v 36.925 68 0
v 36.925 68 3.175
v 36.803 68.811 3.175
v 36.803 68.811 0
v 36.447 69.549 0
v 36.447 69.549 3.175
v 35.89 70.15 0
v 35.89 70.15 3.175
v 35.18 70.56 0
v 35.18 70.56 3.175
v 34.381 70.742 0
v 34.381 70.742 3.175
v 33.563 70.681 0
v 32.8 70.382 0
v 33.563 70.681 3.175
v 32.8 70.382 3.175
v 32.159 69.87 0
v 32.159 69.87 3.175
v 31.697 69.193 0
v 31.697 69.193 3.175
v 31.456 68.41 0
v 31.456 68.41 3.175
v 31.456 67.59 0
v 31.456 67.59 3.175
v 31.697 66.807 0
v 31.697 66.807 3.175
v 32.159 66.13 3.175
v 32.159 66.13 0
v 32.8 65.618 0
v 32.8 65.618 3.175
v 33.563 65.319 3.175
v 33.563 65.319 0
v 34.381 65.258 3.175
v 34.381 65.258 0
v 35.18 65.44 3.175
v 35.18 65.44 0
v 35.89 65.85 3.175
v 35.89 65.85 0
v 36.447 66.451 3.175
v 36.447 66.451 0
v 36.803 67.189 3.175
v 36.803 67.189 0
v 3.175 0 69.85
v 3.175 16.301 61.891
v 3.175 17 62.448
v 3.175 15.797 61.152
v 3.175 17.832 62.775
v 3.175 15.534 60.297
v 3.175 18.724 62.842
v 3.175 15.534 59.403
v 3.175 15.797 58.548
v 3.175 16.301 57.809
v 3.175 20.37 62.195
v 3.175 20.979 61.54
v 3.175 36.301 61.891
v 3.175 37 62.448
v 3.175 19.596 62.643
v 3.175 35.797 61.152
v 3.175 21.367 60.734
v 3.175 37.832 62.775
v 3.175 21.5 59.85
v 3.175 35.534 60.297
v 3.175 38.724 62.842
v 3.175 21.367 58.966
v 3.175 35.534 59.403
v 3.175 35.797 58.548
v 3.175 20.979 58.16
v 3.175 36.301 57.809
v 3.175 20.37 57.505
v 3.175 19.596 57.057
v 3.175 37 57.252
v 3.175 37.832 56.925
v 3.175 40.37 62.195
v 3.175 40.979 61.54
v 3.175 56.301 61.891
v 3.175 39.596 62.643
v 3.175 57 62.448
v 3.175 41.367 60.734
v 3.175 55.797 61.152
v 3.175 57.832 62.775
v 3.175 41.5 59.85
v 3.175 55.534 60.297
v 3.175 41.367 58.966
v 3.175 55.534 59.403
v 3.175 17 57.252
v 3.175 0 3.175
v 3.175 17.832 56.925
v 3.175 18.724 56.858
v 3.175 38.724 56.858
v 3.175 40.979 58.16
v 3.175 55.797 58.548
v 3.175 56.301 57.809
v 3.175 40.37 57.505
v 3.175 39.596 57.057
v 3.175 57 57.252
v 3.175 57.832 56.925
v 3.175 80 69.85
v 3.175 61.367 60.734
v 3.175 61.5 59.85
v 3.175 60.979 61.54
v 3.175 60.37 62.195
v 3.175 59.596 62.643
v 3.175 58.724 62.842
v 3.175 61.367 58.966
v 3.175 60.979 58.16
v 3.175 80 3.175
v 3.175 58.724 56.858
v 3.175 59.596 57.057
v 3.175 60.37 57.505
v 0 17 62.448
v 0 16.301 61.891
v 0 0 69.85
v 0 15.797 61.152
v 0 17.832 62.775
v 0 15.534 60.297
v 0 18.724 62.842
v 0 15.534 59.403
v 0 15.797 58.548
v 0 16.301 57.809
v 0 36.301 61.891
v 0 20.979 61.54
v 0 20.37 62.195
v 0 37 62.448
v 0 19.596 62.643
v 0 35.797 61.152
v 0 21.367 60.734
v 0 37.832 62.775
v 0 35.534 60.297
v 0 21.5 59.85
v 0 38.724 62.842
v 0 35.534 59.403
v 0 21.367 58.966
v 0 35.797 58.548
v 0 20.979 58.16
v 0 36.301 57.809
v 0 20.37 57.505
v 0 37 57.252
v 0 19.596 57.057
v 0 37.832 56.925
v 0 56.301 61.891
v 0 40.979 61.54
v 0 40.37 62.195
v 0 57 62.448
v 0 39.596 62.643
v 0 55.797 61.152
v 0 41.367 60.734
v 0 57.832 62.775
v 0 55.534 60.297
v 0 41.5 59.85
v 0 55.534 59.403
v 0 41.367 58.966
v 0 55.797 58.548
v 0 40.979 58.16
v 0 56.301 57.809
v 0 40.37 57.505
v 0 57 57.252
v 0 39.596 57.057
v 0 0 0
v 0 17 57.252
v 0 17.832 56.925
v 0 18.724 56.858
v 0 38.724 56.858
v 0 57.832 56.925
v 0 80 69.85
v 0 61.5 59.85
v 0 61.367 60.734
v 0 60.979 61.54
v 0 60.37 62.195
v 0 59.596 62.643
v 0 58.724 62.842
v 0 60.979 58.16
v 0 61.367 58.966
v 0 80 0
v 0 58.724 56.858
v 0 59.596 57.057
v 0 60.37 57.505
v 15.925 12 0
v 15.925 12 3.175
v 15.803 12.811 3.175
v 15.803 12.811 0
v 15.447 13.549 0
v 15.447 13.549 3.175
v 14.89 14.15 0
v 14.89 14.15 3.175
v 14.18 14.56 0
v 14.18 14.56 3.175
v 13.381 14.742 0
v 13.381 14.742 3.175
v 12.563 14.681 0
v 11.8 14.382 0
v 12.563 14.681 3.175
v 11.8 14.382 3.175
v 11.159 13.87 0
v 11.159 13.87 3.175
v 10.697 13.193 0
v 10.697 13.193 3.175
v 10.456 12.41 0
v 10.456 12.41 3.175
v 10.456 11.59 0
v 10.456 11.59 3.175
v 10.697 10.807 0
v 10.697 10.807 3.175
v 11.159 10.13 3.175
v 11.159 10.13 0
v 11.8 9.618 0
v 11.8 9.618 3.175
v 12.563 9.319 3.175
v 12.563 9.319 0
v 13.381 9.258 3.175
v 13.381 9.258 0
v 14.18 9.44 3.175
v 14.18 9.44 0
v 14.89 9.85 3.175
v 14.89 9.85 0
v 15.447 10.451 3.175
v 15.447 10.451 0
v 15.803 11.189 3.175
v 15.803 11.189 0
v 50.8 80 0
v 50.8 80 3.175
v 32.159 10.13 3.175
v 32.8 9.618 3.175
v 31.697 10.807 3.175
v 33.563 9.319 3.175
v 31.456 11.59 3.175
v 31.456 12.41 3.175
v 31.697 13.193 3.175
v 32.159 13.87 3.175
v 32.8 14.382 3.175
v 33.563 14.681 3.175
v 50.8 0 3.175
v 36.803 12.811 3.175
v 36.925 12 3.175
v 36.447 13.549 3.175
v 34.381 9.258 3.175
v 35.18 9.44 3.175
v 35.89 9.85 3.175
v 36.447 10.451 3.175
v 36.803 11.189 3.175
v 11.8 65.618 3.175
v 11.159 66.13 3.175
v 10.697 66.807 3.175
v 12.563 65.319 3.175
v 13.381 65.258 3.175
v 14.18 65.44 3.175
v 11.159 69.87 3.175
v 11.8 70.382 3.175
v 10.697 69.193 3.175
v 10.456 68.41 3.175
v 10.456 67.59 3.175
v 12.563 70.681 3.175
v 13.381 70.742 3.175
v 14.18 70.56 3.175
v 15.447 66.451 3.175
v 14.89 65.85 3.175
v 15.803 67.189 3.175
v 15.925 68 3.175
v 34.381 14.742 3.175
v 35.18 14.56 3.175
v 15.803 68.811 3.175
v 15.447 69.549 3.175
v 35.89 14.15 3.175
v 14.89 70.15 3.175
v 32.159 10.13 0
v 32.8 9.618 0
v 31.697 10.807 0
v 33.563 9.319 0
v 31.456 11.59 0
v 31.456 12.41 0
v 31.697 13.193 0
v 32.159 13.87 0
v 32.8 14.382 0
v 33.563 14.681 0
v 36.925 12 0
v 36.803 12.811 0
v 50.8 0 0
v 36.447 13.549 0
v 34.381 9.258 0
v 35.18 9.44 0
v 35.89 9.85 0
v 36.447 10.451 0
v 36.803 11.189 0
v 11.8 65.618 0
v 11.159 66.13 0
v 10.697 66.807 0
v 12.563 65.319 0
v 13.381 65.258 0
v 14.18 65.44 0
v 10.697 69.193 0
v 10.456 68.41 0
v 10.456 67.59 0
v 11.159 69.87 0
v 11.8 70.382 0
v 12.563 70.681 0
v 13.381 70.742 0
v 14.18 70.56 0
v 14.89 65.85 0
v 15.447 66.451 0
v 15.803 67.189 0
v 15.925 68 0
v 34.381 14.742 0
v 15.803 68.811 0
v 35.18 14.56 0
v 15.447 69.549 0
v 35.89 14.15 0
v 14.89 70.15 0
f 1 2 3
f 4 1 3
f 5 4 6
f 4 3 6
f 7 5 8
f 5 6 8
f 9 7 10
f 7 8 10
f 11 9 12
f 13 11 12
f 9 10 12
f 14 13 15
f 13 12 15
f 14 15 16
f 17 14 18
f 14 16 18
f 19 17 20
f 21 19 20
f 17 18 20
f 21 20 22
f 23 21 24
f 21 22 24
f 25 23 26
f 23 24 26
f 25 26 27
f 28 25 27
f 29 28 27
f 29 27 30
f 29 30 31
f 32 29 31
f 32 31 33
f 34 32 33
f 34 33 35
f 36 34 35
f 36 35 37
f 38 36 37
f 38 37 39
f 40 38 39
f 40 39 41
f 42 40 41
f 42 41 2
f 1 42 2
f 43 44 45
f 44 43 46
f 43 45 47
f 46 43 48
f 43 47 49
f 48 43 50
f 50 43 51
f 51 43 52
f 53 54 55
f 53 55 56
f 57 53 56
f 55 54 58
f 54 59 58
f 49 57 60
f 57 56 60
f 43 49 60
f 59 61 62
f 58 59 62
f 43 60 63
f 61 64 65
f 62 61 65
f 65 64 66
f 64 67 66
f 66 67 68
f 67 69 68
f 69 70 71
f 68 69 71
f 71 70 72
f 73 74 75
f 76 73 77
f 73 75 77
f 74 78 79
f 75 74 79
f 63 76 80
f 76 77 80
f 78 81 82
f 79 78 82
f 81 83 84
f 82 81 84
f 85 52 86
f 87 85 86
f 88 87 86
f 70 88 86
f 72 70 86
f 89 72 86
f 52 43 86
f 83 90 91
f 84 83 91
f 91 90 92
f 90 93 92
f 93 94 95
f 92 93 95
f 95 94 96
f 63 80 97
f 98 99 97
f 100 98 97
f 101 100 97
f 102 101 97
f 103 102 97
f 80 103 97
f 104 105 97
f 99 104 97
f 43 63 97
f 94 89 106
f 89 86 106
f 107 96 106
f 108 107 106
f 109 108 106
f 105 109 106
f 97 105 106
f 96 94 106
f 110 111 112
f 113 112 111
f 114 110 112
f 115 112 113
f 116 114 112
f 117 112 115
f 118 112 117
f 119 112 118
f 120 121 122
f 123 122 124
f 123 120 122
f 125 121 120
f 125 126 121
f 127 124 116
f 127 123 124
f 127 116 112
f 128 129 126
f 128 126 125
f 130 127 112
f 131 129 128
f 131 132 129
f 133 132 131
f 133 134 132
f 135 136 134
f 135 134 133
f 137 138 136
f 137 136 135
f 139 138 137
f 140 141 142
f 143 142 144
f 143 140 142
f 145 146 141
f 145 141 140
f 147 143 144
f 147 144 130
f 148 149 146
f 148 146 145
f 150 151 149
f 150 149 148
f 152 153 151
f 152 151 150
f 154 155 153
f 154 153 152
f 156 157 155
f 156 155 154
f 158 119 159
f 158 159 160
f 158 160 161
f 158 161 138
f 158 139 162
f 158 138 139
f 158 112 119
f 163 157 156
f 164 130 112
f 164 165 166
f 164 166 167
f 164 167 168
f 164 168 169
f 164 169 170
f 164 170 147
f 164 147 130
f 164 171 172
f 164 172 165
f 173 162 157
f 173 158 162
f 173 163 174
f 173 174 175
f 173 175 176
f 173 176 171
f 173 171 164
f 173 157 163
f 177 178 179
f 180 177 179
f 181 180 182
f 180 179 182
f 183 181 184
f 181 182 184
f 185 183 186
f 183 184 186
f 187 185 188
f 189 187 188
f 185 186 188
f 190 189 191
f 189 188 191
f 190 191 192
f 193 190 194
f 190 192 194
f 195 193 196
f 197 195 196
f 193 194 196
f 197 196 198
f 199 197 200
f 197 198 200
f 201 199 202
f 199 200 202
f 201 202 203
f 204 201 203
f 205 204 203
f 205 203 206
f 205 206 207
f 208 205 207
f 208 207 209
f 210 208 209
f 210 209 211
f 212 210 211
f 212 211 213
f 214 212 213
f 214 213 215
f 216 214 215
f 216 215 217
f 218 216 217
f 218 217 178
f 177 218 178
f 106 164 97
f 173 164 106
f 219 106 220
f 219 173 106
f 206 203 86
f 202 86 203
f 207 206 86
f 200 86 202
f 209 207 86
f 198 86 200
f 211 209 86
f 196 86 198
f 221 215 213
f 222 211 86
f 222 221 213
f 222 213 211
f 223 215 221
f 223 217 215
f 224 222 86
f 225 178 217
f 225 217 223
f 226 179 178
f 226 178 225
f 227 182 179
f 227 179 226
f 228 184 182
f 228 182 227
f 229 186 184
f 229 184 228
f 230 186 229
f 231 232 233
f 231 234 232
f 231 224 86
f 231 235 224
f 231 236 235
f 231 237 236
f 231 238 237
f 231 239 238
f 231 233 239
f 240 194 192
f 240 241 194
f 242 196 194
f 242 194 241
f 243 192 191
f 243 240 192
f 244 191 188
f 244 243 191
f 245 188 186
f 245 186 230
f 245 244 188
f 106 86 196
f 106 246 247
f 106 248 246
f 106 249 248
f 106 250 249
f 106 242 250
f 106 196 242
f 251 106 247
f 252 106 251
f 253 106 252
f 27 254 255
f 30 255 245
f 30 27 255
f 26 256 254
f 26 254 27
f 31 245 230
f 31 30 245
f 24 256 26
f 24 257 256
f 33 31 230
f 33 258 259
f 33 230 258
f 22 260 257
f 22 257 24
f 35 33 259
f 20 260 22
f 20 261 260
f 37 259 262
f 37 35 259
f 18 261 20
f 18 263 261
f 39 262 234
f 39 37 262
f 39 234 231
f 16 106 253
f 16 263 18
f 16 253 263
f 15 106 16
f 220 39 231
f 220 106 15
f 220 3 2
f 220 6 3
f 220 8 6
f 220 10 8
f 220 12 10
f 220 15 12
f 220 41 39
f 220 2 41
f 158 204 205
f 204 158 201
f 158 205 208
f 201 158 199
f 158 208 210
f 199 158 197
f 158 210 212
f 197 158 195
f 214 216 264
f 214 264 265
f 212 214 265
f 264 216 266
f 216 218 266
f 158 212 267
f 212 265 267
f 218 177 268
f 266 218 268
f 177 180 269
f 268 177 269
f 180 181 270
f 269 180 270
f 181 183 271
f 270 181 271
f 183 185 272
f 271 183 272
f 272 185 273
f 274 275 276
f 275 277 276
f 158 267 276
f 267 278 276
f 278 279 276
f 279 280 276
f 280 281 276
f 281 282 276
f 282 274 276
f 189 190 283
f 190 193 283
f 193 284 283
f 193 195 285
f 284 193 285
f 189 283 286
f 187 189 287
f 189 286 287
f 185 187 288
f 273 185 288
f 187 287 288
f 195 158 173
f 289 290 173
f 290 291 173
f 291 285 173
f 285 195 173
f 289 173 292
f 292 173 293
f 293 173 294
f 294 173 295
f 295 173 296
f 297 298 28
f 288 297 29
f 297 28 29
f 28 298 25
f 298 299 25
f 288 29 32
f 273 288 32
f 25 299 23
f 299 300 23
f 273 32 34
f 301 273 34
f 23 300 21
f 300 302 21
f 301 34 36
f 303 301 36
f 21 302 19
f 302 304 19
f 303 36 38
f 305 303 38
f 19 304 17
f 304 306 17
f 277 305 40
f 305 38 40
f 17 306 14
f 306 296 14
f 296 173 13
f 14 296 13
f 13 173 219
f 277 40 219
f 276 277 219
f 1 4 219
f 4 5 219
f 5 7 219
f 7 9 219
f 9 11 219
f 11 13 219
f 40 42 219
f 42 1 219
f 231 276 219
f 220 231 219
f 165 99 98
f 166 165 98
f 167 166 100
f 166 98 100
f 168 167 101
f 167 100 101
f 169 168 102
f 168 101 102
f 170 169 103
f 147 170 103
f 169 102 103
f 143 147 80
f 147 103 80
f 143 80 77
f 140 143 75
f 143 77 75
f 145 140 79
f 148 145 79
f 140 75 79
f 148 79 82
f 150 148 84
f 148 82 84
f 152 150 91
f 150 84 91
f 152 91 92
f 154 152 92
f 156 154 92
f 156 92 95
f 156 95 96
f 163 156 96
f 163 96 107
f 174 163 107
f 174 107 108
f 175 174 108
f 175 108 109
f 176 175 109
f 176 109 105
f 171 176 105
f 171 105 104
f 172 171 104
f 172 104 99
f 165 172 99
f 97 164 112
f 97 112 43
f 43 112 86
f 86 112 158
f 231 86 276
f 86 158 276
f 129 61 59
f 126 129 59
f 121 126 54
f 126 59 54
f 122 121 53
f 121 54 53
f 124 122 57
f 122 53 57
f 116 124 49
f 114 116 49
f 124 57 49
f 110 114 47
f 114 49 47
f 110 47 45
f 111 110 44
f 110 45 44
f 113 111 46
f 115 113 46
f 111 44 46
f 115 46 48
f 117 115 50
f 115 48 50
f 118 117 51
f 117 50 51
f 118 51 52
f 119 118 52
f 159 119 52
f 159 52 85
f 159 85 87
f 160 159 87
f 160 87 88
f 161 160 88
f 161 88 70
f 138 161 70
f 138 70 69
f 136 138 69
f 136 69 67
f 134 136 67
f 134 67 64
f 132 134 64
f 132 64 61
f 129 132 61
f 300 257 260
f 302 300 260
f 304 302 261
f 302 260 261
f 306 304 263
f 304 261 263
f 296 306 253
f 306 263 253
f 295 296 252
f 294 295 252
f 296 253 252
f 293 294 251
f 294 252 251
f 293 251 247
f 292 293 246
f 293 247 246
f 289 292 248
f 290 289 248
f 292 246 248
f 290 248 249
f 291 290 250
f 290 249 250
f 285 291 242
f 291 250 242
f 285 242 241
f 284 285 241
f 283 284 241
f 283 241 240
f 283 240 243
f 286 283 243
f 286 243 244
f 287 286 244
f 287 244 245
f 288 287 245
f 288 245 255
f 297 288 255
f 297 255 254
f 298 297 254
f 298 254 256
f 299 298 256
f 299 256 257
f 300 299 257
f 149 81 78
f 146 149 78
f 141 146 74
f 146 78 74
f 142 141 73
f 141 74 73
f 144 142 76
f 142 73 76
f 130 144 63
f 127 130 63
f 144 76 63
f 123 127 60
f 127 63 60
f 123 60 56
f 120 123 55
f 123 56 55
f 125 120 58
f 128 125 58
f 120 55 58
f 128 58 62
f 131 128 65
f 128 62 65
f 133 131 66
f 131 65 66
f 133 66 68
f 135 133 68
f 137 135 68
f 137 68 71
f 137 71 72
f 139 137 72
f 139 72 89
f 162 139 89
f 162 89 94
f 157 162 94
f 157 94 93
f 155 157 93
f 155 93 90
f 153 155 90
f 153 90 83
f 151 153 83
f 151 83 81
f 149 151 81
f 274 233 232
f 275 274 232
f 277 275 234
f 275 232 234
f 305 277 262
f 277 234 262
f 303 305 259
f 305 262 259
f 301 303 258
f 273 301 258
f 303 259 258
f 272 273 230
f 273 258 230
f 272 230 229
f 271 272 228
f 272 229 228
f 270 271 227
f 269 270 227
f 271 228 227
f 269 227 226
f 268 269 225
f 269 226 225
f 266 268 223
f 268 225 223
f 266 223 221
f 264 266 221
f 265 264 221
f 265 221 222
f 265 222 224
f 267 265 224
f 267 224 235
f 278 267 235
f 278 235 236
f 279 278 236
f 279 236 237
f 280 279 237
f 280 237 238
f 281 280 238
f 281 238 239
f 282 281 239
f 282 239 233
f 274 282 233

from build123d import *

# Parameters (mm, degrees)
CROQUIS2_W              = 50.8
CROQUIS2_H              = 80
SALIENTE_EXTRUIR1_DEPTH = 3.175
CROQUIS3_W              = 3.175
CROQUIS3_H              = 80
SALIENTE_EXTRUIR2_DEPTH = 66.675
CROQUIS4_R              = 2.75
CORTAR_EXTRUIR1_DEPTH   = 47.625
CROQUIS5_R              = 3
CORTAR_EXTRUIR2_DEPTH   = 47.625


with BuildPart() as part:
    # Croquis2 → Saliente-Extruir1 (new body)
    with BuildSketch(Plane.XY):
        with Locations((25.4, 40)):
            Rectangle(CROQUIS2_W, CROQUIS2_H)
    extrude(amount=SALIENTE_EXTRUIR1_DEPTH)

    # Croquis3 → Saliente-Extruir2 (add)
    with BuildSketch(Plane.XY.offset(3.175)):
        with Locations((1.5875, 40)):
            Rectangle(CROQUIS3_W, CROQUIS3_H)
    extrude(amount=SALIENTE_EXTRUIR2_DEPTH)

    # Croquis4 → Cortar-Extruir1 (cut)
    with BuildSketch(Plane.XY.offset(3.175)):
        with Locations((13.175, 68)):
            Circle(CROQUIS4_R)
        with Locations((13.175, 12)):
            Circle(CROQUIS4_R)
        with Locations((34.175, 68)):
            Circle(CROQUIS4_R)
        with Locations((34.175, 12)):
            Circle(CROQUIS4_R)
    extrude(amount=-CORTAR_EXTRUIR1_DEPTH, mode=Mode.SUBTRACT)

    # Croquis5 → Cortar-Extruir2 (cut)
    with BuildSketch(Plane(origin=(3.175, 0, 0), x_dir=(0, 0, -1), z_dir=(1, 0, 0))):
        with Locations(Location((-59.85, 18.5, 0), (0, 0, 90))):
            Circle(CROQUIS5_R)
        with Locations(Location((-59.85, 38.5, 0), (0, 0, 90))):
            Circle(CROQUIS5_R)
        with Locations(Location((-59.85, 58.5, 0), (0, 0, 90))):
            Circle(CROQUIS5_R)
    extrude(amount=-CORTAR_EXTRUIR2_DEPTH, mode=Mode.SUBTRACT)


solid = part.part
